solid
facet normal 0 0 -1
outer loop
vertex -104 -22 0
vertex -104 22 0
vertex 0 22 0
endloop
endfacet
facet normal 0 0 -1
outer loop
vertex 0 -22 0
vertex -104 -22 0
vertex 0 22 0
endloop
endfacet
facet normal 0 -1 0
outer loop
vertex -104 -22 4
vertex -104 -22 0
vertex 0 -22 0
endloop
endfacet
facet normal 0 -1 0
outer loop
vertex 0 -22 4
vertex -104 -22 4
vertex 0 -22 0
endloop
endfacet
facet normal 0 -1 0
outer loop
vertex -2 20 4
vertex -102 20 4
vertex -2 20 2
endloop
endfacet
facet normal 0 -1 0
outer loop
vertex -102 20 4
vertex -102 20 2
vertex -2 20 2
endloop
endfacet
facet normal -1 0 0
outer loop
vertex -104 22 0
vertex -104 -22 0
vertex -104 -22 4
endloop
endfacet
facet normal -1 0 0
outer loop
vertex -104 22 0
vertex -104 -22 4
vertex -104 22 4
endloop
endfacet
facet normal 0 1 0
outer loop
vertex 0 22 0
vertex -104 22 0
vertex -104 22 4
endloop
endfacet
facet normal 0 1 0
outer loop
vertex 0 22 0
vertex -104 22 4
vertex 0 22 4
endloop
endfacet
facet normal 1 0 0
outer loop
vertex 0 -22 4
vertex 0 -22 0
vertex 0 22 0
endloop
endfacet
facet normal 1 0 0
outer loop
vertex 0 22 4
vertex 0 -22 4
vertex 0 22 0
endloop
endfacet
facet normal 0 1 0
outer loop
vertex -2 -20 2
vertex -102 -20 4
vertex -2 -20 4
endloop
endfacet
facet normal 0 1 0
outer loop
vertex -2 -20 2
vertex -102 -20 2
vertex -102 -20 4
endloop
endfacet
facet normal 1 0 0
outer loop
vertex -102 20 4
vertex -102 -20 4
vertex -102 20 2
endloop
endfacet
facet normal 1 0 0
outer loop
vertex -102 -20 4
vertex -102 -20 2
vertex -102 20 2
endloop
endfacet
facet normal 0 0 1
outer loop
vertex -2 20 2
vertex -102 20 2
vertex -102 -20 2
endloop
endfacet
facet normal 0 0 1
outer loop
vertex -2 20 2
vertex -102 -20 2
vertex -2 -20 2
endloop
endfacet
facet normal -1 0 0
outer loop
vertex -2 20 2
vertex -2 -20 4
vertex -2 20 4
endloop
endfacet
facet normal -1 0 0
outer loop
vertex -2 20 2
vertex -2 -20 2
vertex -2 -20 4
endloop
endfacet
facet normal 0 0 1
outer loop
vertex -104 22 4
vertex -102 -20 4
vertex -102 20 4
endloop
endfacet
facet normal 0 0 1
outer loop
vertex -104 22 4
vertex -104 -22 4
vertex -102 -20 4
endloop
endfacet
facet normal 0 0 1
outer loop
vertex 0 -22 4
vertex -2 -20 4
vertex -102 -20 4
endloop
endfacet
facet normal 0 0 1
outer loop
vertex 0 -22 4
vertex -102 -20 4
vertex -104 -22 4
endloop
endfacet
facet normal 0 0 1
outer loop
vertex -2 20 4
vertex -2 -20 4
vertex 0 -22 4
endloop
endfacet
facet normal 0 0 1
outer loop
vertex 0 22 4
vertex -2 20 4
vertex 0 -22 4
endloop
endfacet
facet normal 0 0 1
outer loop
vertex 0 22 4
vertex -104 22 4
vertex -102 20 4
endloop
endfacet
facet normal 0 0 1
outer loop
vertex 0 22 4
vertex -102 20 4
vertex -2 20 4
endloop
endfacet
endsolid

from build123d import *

# Parameters (mm, degrees)
F0_W     = 104
F0_H     = 44
F1_DEPTH = 4
F2_T     = -2
F4_DEPTH = 10


with BuildPart() as f1:
    # F0 (on Top) → F1 (new body)
    with BuildSketch(Plane.XY):
        with Locations((-52, 0)):
            Rectangle(F0_W, F0_H)
    extrude(amount=F1_DEPTH)

    # F2
    f2_openings = [f1.faces().sort_by_distance(p)[0] for p in [
        (-52, 0, 4),
    ]]
    offset(amount=F2_T, openings=f2_openings)

    # F3 (on face) → F4 (cut)
    with BuildSketch(Plane.XY):
        with BuildLine():
            Line((-82.539678, 22), (-21.460322, 22))
            ThreePointArc((-21.460322, 22), (-20.730103, 22.059424), (-20, 22.120252))
            Line((-20, 22.120252), (-20, 36.755234))
            Line((-20, 36.755234), (-84, 36.755234))
            Line((-84, 36.755234), (-84, 22.120252))
            ThreePointArc((-84, 22.120252), (-83.269897, 22.059424), (-82.539678, 22))
        make_face()
        with BuildLine():
            Line((-20, -36.755234), (-20, -22.120252))
            ThreePointArc((-20, -22.120252), (-20.730103, -22.059424), (-21.460322, -22))
            Line((-21.460322, -22), (-82.539678, -22))
            ThreePointArc((-82.539678, -22), (-83.269897, -22.059424), (-84, -22.120252))
            Line((-84, -22.120252), (-84, -36.755234))
            Line((-84, -36.755234), (-20, -36.755234))
        make_face()
    extrude(amount=F4_DEPTH, mode=Mode.SUBTRACT)


solid = f1.part
